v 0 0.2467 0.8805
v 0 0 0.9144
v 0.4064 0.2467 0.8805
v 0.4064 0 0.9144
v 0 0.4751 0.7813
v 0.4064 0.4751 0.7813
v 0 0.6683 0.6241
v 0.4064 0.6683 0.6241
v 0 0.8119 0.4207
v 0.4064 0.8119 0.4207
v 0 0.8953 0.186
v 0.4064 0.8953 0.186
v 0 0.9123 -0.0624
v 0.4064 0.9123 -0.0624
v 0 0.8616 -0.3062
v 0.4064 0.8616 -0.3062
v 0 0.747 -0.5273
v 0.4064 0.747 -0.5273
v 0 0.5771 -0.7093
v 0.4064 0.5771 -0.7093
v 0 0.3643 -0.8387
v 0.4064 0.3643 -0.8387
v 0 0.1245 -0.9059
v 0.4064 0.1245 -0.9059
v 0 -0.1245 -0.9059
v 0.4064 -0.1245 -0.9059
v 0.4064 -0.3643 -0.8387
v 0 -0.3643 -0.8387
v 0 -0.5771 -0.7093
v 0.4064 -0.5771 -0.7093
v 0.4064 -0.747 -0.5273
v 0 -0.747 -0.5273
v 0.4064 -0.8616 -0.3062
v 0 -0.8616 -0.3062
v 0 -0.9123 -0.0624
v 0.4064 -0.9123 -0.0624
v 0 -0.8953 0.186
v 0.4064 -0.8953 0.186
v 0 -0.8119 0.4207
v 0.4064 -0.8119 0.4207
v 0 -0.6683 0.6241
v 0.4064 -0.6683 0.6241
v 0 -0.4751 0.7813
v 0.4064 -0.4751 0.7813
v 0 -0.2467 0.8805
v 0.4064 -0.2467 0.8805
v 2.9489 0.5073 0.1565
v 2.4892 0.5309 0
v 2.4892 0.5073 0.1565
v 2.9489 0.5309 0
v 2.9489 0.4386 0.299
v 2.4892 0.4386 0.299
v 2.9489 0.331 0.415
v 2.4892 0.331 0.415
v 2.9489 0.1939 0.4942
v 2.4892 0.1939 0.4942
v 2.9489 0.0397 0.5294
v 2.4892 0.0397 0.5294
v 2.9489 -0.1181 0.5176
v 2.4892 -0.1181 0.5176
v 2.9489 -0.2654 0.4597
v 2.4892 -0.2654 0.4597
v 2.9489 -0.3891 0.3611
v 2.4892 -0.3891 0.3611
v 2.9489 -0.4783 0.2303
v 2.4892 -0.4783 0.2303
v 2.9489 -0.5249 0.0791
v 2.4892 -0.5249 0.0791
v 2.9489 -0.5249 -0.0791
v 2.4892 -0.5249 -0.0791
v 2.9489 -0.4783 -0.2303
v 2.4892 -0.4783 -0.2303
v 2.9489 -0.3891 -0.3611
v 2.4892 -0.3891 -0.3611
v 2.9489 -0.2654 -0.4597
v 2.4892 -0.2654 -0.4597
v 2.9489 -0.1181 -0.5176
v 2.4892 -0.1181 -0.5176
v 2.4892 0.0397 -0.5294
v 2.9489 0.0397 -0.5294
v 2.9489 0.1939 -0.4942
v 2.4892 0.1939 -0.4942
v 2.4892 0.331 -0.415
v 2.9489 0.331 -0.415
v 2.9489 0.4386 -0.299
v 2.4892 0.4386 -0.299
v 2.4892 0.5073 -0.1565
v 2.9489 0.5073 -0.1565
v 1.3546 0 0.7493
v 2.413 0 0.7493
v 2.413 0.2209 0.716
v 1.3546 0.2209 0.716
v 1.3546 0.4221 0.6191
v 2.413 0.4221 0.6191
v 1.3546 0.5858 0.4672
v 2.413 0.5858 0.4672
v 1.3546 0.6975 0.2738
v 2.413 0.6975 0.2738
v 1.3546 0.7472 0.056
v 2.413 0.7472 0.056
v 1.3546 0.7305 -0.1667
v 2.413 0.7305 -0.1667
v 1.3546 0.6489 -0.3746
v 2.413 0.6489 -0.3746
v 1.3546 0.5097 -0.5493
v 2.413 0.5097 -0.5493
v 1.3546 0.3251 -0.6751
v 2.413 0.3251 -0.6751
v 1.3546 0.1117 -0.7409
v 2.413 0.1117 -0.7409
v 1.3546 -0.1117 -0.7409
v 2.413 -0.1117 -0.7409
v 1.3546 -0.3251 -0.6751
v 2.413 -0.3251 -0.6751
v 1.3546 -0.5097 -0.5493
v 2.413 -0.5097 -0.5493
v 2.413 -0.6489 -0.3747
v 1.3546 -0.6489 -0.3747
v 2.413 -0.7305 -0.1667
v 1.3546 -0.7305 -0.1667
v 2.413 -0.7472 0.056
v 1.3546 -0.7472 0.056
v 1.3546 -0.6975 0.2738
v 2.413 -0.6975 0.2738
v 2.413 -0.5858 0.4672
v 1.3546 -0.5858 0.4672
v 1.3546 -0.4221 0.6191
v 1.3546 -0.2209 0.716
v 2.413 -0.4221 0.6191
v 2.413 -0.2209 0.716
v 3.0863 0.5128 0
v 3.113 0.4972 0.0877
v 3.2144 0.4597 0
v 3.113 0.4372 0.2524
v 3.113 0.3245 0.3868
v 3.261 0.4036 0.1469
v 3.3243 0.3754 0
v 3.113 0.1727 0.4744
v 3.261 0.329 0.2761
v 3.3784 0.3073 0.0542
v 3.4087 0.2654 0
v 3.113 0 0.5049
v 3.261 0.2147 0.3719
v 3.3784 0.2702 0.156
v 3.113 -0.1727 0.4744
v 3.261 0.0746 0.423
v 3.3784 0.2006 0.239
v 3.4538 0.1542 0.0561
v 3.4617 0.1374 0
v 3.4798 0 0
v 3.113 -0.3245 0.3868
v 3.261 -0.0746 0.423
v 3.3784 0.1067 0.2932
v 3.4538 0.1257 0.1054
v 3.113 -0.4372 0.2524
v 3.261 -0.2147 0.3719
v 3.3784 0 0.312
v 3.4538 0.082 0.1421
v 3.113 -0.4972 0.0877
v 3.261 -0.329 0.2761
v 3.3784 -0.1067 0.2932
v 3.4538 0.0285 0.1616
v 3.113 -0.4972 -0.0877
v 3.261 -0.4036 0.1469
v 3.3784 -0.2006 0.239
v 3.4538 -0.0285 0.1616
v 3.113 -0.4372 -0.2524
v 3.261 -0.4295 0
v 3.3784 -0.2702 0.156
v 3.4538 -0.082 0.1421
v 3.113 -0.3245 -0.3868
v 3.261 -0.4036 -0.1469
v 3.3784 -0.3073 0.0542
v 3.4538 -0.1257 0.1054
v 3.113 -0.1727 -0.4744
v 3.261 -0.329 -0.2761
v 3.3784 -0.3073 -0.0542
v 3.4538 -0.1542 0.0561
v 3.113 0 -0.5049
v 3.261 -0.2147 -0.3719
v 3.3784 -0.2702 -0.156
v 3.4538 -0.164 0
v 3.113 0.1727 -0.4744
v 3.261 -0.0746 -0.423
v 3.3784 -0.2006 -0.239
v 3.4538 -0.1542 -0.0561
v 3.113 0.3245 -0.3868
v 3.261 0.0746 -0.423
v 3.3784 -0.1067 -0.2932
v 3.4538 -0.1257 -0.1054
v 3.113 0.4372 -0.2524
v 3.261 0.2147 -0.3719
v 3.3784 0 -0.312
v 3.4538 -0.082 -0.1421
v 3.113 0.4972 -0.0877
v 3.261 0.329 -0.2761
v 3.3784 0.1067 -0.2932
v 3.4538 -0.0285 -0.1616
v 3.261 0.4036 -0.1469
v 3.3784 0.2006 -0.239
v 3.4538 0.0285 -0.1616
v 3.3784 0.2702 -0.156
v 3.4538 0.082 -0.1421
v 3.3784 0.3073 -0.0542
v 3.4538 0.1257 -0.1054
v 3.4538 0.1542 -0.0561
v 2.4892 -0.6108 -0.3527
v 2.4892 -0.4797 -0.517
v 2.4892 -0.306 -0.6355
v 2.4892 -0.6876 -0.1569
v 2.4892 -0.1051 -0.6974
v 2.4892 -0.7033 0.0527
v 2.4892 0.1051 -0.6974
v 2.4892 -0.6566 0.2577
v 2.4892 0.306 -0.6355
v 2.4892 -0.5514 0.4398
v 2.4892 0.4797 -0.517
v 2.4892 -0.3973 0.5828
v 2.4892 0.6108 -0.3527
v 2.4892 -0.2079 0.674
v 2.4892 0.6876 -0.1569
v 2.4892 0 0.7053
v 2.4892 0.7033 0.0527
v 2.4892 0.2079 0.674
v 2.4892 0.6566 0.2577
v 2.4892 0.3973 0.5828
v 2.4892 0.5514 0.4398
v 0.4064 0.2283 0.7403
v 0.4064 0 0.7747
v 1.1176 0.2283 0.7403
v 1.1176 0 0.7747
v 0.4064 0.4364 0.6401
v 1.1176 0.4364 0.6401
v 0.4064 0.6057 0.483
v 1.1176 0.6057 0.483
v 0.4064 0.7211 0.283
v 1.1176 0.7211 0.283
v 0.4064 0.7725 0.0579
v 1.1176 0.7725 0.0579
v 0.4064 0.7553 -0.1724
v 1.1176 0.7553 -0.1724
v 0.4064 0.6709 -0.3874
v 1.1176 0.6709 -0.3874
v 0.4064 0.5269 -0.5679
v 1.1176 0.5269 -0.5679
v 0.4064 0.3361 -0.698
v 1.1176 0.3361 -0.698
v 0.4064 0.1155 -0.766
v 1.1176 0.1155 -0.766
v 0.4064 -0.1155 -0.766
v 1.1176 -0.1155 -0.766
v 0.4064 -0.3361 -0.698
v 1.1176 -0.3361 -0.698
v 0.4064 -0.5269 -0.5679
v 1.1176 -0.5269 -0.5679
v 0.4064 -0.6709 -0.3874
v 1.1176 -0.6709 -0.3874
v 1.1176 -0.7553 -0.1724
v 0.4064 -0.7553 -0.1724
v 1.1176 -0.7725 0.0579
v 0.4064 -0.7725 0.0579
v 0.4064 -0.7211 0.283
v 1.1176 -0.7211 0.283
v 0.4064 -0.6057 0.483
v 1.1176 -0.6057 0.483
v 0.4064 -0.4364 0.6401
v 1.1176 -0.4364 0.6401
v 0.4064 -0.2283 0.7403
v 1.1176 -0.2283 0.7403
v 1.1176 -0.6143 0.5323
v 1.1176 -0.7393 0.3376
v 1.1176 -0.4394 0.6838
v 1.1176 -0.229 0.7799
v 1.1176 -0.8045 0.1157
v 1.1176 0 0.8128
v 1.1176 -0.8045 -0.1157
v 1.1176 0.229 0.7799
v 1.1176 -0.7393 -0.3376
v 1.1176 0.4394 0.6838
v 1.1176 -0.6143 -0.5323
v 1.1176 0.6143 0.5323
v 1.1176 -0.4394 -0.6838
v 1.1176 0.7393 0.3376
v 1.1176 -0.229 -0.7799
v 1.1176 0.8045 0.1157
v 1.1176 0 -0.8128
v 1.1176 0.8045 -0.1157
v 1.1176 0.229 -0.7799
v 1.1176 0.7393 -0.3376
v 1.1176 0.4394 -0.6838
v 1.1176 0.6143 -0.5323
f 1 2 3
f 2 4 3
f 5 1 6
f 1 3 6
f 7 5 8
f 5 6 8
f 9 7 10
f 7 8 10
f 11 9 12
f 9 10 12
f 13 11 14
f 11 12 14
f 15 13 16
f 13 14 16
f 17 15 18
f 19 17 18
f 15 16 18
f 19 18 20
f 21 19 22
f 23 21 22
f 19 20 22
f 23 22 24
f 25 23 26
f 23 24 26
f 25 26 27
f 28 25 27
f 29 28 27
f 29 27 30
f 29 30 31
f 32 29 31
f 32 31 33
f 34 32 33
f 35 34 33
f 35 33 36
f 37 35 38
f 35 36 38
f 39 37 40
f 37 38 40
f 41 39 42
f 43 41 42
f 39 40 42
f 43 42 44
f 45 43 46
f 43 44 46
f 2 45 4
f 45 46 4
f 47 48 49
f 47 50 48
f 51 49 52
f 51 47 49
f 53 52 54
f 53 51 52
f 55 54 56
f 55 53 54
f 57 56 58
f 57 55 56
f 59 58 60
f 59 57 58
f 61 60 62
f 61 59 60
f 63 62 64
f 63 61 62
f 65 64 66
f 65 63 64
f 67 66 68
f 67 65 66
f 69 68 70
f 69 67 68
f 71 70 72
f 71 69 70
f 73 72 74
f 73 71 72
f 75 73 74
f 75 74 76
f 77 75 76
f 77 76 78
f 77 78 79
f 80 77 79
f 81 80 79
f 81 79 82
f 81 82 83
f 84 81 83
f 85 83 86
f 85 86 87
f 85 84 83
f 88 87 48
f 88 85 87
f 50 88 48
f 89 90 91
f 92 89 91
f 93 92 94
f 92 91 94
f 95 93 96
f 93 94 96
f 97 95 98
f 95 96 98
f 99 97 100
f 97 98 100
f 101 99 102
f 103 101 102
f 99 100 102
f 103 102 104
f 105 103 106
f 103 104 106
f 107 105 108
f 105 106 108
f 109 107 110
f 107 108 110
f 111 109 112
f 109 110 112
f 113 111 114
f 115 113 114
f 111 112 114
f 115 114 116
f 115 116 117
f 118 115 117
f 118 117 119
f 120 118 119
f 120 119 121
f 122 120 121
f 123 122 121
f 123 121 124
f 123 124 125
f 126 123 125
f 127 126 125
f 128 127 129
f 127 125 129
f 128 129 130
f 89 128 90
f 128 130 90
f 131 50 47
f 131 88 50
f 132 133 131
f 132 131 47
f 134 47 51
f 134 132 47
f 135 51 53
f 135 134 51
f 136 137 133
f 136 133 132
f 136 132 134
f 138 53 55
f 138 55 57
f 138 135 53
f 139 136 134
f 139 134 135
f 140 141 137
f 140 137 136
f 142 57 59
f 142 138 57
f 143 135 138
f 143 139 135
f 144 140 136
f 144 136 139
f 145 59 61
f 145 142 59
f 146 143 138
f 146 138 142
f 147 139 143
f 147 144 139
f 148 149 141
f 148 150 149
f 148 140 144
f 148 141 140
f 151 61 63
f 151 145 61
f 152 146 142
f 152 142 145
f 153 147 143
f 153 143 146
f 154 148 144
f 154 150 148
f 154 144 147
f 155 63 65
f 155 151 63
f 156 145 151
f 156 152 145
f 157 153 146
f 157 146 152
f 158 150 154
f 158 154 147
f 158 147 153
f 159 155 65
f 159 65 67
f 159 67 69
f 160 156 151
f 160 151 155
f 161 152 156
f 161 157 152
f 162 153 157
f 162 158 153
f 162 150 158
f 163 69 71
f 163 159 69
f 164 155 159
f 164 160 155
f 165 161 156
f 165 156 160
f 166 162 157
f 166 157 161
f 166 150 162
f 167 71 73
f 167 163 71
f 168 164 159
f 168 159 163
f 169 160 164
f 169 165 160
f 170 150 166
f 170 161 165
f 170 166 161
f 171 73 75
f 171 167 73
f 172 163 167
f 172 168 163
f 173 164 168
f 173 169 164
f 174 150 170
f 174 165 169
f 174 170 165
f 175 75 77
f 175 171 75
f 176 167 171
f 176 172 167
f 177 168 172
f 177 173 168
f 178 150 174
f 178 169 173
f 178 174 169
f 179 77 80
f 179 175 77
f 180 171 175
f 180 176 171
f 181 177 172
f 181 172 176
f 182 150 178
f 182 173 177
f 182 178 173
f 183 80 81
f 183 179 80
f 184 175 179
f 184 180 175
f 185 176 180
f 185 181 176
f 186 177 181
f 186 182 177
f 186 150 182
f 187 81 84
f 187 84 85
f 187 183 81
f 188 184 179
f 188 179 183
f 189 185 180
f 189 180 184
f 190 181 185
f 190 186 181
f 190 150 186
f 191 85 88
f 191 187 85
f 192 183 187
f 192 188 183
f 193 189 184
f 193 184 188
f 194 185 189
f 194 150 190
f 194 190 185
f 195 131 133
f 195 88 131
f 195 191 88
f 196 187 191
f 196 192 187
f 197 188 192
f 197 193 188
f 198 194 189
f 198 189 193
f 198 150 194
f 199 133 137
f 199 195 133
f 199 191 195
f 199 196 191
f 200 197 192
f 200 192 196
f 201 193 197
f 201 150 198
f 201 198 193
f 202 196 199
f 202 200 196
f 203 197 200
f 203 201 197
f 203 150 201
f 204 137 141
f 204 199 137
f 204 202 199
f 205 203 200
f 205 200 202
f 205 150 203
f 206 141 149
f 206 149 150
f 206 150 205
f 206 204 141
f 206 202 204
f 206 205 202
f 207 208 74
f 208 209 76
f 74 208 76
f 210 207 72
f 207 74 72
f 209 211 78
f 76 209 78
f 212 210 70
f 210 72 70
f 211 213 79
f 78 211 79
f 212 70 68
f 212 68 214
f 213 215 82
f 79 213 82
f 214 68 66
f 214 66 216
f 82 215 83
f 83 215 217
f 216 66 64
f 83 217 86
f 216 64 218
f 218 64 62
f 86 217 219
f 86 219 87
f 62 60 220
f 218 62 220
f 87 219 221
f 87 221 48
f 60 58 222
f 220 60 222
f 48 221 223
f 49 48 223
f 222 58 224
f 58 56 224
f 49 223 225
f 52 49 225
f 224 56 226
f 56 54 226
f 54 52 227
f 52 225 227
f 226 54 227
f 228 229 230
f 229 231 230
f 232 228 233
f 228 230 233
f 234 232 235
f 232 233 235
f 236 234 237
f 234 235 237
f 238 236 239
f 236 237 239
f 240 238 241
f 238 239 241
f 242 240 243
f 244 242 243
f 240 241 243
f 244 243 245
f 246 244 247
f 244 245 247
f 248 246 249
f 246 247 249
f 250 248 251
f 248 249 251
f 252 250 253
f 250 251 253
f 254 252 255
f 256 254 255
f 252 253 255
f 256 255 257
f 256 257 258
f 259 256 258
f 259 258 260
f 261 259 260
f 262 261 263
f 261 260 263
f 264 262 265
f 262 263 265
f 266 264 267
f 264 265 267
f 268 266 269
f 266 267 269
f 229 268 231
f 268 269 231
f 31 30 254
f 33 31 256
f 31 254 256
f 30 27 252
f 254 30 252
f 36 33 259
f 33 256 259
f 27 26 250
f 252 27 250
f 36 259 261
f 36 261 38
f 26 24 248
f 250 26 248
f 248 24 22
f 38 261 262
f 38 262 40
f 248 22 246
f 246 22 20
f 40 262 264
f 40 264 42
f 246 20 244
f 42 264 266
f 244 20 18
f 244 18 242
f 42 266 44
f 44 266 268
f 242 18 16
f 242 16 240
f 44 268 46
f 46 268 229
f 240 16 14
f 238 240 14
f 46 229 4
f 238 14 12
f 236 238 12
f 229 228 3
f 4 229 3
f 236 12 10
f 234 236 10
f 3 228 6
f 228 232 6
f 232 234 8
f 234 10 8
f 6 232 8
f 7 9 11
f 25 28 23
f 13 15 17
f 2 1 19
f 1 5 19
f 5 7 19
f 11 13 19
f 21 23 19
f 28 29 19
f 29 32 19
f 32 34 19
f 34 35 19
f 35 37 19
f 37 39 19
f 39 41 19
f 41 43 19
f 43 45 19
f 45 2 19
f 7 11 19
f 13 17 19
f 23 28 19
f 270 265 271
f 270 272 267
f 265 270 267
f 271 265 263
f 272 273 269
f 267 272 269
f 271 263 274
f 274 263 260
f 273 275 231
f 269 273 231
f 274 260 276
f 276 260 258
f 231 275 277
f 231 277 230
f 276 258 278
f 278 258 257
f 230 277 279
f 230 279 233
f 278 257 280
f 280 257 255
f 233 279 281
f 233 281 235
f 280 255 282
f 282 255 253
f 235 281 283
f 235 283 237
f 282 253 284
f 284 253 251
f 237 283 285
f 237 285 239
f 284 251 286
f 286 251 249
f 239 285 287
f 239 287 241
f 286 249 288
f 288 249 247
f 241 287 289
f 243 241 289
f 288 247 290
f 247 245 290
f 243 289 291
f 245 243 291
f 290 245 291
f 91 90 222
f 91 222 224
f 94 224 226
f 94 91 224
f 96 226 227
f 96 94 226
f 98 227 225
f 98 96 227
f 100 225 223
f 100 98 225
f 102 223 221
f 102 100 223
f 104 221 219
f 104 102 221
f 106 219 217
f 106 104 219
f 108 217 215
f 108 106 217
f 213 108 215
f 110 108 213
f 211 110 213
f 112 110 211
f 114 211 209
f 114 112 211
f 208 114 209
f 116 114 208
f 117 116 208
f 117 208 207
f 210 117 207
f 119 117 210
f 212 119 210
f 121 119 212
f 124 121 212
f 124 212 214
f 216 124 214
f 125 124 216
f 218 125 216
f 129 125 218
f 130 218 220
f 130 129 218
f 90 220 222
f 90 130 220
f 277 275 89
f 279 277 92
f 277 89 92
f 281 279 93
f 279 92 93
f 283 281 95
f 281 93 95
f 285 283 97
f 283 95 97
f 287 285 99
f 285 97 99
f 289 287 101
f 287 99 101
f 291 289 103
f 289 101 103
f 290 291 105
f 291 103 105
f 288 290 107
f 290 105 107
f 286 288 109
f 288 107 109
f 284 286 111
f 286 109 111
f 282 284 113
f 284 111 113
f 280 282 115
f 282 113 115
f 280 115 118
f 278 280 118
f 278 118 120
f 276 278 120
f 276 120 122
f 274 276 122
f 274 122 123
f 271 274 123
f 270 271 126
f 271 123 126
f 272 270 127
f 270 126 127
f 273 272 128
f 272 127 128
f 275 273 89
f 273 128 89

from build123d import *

# Parameters (mm, degrees)
CHAMFER1_SIZE  = 0.043994091
CHAMFER1_SIZE2 = 0.0762


# Read off the part's stored shape, not the designer's step: Boss-Extrude1
with BuildPart() as part:
    # Sketch1 → Revolve1 (revolve)
    with BuildSketch(Plane(origin=(0, 0, 0), x_dir=(-1, 0, 0), z_dir=(0, 0, -1)), mode=Mode.PRIVATE) as revolve1_sk:
        Polygon((-2.4892, 0.7493), (-2.4892, 0), (0, 0), (0, 0.9144), (-0.4064, 0.9144), (-0.4064, 0.7747), (-1.1176, 0.7747), (-1.1176, 0.8128), (-1.354585226, 0.7493), align=None)
    revolve(revolve1_sk.sketch.rotate(Axis((2.4892, 0, 0), (-1, 0, 0)), 270), axis=Axis((2.4892, 0, 0), (-1, 0, 0)))

    # Boss-Extrude1 outline → Boss-Extrude1 (revolve)
    with BuildSketch(Plane.YX):
        with BuildLine():
            Line((0.53086, 2.4892), (0.53086, 2.948939999))
            ThreePointArc((0.53086, 2.948939999), (0.375374706, 3.324314706), (0, 3.4798))
            Line((0, 3.4798), (0, 2.4892))
            Line((0, 2.4892), (0.53086, 2.4892))
        make_face()
    revolve(axis=Axis((0, 0, 0), (1, 0, 0)))

    # Chamfer1
    chamfer1_edges = [part.edges().sort_by_distance(p)[0] for p in [
        (2.4892, 0, -0.7493),
    ]]
    chamfer1_side = [part.faces().sort_by_distance(p)[0] for p in [
        (2.4892, 0, -0.728106596),
    ]]
    chamfer(chamfer1_edges, length=CHAMFER1_SIZE, length2=CHAMFER1_SIZE2, reference=chamfer1_side[0])


solid = part.part
